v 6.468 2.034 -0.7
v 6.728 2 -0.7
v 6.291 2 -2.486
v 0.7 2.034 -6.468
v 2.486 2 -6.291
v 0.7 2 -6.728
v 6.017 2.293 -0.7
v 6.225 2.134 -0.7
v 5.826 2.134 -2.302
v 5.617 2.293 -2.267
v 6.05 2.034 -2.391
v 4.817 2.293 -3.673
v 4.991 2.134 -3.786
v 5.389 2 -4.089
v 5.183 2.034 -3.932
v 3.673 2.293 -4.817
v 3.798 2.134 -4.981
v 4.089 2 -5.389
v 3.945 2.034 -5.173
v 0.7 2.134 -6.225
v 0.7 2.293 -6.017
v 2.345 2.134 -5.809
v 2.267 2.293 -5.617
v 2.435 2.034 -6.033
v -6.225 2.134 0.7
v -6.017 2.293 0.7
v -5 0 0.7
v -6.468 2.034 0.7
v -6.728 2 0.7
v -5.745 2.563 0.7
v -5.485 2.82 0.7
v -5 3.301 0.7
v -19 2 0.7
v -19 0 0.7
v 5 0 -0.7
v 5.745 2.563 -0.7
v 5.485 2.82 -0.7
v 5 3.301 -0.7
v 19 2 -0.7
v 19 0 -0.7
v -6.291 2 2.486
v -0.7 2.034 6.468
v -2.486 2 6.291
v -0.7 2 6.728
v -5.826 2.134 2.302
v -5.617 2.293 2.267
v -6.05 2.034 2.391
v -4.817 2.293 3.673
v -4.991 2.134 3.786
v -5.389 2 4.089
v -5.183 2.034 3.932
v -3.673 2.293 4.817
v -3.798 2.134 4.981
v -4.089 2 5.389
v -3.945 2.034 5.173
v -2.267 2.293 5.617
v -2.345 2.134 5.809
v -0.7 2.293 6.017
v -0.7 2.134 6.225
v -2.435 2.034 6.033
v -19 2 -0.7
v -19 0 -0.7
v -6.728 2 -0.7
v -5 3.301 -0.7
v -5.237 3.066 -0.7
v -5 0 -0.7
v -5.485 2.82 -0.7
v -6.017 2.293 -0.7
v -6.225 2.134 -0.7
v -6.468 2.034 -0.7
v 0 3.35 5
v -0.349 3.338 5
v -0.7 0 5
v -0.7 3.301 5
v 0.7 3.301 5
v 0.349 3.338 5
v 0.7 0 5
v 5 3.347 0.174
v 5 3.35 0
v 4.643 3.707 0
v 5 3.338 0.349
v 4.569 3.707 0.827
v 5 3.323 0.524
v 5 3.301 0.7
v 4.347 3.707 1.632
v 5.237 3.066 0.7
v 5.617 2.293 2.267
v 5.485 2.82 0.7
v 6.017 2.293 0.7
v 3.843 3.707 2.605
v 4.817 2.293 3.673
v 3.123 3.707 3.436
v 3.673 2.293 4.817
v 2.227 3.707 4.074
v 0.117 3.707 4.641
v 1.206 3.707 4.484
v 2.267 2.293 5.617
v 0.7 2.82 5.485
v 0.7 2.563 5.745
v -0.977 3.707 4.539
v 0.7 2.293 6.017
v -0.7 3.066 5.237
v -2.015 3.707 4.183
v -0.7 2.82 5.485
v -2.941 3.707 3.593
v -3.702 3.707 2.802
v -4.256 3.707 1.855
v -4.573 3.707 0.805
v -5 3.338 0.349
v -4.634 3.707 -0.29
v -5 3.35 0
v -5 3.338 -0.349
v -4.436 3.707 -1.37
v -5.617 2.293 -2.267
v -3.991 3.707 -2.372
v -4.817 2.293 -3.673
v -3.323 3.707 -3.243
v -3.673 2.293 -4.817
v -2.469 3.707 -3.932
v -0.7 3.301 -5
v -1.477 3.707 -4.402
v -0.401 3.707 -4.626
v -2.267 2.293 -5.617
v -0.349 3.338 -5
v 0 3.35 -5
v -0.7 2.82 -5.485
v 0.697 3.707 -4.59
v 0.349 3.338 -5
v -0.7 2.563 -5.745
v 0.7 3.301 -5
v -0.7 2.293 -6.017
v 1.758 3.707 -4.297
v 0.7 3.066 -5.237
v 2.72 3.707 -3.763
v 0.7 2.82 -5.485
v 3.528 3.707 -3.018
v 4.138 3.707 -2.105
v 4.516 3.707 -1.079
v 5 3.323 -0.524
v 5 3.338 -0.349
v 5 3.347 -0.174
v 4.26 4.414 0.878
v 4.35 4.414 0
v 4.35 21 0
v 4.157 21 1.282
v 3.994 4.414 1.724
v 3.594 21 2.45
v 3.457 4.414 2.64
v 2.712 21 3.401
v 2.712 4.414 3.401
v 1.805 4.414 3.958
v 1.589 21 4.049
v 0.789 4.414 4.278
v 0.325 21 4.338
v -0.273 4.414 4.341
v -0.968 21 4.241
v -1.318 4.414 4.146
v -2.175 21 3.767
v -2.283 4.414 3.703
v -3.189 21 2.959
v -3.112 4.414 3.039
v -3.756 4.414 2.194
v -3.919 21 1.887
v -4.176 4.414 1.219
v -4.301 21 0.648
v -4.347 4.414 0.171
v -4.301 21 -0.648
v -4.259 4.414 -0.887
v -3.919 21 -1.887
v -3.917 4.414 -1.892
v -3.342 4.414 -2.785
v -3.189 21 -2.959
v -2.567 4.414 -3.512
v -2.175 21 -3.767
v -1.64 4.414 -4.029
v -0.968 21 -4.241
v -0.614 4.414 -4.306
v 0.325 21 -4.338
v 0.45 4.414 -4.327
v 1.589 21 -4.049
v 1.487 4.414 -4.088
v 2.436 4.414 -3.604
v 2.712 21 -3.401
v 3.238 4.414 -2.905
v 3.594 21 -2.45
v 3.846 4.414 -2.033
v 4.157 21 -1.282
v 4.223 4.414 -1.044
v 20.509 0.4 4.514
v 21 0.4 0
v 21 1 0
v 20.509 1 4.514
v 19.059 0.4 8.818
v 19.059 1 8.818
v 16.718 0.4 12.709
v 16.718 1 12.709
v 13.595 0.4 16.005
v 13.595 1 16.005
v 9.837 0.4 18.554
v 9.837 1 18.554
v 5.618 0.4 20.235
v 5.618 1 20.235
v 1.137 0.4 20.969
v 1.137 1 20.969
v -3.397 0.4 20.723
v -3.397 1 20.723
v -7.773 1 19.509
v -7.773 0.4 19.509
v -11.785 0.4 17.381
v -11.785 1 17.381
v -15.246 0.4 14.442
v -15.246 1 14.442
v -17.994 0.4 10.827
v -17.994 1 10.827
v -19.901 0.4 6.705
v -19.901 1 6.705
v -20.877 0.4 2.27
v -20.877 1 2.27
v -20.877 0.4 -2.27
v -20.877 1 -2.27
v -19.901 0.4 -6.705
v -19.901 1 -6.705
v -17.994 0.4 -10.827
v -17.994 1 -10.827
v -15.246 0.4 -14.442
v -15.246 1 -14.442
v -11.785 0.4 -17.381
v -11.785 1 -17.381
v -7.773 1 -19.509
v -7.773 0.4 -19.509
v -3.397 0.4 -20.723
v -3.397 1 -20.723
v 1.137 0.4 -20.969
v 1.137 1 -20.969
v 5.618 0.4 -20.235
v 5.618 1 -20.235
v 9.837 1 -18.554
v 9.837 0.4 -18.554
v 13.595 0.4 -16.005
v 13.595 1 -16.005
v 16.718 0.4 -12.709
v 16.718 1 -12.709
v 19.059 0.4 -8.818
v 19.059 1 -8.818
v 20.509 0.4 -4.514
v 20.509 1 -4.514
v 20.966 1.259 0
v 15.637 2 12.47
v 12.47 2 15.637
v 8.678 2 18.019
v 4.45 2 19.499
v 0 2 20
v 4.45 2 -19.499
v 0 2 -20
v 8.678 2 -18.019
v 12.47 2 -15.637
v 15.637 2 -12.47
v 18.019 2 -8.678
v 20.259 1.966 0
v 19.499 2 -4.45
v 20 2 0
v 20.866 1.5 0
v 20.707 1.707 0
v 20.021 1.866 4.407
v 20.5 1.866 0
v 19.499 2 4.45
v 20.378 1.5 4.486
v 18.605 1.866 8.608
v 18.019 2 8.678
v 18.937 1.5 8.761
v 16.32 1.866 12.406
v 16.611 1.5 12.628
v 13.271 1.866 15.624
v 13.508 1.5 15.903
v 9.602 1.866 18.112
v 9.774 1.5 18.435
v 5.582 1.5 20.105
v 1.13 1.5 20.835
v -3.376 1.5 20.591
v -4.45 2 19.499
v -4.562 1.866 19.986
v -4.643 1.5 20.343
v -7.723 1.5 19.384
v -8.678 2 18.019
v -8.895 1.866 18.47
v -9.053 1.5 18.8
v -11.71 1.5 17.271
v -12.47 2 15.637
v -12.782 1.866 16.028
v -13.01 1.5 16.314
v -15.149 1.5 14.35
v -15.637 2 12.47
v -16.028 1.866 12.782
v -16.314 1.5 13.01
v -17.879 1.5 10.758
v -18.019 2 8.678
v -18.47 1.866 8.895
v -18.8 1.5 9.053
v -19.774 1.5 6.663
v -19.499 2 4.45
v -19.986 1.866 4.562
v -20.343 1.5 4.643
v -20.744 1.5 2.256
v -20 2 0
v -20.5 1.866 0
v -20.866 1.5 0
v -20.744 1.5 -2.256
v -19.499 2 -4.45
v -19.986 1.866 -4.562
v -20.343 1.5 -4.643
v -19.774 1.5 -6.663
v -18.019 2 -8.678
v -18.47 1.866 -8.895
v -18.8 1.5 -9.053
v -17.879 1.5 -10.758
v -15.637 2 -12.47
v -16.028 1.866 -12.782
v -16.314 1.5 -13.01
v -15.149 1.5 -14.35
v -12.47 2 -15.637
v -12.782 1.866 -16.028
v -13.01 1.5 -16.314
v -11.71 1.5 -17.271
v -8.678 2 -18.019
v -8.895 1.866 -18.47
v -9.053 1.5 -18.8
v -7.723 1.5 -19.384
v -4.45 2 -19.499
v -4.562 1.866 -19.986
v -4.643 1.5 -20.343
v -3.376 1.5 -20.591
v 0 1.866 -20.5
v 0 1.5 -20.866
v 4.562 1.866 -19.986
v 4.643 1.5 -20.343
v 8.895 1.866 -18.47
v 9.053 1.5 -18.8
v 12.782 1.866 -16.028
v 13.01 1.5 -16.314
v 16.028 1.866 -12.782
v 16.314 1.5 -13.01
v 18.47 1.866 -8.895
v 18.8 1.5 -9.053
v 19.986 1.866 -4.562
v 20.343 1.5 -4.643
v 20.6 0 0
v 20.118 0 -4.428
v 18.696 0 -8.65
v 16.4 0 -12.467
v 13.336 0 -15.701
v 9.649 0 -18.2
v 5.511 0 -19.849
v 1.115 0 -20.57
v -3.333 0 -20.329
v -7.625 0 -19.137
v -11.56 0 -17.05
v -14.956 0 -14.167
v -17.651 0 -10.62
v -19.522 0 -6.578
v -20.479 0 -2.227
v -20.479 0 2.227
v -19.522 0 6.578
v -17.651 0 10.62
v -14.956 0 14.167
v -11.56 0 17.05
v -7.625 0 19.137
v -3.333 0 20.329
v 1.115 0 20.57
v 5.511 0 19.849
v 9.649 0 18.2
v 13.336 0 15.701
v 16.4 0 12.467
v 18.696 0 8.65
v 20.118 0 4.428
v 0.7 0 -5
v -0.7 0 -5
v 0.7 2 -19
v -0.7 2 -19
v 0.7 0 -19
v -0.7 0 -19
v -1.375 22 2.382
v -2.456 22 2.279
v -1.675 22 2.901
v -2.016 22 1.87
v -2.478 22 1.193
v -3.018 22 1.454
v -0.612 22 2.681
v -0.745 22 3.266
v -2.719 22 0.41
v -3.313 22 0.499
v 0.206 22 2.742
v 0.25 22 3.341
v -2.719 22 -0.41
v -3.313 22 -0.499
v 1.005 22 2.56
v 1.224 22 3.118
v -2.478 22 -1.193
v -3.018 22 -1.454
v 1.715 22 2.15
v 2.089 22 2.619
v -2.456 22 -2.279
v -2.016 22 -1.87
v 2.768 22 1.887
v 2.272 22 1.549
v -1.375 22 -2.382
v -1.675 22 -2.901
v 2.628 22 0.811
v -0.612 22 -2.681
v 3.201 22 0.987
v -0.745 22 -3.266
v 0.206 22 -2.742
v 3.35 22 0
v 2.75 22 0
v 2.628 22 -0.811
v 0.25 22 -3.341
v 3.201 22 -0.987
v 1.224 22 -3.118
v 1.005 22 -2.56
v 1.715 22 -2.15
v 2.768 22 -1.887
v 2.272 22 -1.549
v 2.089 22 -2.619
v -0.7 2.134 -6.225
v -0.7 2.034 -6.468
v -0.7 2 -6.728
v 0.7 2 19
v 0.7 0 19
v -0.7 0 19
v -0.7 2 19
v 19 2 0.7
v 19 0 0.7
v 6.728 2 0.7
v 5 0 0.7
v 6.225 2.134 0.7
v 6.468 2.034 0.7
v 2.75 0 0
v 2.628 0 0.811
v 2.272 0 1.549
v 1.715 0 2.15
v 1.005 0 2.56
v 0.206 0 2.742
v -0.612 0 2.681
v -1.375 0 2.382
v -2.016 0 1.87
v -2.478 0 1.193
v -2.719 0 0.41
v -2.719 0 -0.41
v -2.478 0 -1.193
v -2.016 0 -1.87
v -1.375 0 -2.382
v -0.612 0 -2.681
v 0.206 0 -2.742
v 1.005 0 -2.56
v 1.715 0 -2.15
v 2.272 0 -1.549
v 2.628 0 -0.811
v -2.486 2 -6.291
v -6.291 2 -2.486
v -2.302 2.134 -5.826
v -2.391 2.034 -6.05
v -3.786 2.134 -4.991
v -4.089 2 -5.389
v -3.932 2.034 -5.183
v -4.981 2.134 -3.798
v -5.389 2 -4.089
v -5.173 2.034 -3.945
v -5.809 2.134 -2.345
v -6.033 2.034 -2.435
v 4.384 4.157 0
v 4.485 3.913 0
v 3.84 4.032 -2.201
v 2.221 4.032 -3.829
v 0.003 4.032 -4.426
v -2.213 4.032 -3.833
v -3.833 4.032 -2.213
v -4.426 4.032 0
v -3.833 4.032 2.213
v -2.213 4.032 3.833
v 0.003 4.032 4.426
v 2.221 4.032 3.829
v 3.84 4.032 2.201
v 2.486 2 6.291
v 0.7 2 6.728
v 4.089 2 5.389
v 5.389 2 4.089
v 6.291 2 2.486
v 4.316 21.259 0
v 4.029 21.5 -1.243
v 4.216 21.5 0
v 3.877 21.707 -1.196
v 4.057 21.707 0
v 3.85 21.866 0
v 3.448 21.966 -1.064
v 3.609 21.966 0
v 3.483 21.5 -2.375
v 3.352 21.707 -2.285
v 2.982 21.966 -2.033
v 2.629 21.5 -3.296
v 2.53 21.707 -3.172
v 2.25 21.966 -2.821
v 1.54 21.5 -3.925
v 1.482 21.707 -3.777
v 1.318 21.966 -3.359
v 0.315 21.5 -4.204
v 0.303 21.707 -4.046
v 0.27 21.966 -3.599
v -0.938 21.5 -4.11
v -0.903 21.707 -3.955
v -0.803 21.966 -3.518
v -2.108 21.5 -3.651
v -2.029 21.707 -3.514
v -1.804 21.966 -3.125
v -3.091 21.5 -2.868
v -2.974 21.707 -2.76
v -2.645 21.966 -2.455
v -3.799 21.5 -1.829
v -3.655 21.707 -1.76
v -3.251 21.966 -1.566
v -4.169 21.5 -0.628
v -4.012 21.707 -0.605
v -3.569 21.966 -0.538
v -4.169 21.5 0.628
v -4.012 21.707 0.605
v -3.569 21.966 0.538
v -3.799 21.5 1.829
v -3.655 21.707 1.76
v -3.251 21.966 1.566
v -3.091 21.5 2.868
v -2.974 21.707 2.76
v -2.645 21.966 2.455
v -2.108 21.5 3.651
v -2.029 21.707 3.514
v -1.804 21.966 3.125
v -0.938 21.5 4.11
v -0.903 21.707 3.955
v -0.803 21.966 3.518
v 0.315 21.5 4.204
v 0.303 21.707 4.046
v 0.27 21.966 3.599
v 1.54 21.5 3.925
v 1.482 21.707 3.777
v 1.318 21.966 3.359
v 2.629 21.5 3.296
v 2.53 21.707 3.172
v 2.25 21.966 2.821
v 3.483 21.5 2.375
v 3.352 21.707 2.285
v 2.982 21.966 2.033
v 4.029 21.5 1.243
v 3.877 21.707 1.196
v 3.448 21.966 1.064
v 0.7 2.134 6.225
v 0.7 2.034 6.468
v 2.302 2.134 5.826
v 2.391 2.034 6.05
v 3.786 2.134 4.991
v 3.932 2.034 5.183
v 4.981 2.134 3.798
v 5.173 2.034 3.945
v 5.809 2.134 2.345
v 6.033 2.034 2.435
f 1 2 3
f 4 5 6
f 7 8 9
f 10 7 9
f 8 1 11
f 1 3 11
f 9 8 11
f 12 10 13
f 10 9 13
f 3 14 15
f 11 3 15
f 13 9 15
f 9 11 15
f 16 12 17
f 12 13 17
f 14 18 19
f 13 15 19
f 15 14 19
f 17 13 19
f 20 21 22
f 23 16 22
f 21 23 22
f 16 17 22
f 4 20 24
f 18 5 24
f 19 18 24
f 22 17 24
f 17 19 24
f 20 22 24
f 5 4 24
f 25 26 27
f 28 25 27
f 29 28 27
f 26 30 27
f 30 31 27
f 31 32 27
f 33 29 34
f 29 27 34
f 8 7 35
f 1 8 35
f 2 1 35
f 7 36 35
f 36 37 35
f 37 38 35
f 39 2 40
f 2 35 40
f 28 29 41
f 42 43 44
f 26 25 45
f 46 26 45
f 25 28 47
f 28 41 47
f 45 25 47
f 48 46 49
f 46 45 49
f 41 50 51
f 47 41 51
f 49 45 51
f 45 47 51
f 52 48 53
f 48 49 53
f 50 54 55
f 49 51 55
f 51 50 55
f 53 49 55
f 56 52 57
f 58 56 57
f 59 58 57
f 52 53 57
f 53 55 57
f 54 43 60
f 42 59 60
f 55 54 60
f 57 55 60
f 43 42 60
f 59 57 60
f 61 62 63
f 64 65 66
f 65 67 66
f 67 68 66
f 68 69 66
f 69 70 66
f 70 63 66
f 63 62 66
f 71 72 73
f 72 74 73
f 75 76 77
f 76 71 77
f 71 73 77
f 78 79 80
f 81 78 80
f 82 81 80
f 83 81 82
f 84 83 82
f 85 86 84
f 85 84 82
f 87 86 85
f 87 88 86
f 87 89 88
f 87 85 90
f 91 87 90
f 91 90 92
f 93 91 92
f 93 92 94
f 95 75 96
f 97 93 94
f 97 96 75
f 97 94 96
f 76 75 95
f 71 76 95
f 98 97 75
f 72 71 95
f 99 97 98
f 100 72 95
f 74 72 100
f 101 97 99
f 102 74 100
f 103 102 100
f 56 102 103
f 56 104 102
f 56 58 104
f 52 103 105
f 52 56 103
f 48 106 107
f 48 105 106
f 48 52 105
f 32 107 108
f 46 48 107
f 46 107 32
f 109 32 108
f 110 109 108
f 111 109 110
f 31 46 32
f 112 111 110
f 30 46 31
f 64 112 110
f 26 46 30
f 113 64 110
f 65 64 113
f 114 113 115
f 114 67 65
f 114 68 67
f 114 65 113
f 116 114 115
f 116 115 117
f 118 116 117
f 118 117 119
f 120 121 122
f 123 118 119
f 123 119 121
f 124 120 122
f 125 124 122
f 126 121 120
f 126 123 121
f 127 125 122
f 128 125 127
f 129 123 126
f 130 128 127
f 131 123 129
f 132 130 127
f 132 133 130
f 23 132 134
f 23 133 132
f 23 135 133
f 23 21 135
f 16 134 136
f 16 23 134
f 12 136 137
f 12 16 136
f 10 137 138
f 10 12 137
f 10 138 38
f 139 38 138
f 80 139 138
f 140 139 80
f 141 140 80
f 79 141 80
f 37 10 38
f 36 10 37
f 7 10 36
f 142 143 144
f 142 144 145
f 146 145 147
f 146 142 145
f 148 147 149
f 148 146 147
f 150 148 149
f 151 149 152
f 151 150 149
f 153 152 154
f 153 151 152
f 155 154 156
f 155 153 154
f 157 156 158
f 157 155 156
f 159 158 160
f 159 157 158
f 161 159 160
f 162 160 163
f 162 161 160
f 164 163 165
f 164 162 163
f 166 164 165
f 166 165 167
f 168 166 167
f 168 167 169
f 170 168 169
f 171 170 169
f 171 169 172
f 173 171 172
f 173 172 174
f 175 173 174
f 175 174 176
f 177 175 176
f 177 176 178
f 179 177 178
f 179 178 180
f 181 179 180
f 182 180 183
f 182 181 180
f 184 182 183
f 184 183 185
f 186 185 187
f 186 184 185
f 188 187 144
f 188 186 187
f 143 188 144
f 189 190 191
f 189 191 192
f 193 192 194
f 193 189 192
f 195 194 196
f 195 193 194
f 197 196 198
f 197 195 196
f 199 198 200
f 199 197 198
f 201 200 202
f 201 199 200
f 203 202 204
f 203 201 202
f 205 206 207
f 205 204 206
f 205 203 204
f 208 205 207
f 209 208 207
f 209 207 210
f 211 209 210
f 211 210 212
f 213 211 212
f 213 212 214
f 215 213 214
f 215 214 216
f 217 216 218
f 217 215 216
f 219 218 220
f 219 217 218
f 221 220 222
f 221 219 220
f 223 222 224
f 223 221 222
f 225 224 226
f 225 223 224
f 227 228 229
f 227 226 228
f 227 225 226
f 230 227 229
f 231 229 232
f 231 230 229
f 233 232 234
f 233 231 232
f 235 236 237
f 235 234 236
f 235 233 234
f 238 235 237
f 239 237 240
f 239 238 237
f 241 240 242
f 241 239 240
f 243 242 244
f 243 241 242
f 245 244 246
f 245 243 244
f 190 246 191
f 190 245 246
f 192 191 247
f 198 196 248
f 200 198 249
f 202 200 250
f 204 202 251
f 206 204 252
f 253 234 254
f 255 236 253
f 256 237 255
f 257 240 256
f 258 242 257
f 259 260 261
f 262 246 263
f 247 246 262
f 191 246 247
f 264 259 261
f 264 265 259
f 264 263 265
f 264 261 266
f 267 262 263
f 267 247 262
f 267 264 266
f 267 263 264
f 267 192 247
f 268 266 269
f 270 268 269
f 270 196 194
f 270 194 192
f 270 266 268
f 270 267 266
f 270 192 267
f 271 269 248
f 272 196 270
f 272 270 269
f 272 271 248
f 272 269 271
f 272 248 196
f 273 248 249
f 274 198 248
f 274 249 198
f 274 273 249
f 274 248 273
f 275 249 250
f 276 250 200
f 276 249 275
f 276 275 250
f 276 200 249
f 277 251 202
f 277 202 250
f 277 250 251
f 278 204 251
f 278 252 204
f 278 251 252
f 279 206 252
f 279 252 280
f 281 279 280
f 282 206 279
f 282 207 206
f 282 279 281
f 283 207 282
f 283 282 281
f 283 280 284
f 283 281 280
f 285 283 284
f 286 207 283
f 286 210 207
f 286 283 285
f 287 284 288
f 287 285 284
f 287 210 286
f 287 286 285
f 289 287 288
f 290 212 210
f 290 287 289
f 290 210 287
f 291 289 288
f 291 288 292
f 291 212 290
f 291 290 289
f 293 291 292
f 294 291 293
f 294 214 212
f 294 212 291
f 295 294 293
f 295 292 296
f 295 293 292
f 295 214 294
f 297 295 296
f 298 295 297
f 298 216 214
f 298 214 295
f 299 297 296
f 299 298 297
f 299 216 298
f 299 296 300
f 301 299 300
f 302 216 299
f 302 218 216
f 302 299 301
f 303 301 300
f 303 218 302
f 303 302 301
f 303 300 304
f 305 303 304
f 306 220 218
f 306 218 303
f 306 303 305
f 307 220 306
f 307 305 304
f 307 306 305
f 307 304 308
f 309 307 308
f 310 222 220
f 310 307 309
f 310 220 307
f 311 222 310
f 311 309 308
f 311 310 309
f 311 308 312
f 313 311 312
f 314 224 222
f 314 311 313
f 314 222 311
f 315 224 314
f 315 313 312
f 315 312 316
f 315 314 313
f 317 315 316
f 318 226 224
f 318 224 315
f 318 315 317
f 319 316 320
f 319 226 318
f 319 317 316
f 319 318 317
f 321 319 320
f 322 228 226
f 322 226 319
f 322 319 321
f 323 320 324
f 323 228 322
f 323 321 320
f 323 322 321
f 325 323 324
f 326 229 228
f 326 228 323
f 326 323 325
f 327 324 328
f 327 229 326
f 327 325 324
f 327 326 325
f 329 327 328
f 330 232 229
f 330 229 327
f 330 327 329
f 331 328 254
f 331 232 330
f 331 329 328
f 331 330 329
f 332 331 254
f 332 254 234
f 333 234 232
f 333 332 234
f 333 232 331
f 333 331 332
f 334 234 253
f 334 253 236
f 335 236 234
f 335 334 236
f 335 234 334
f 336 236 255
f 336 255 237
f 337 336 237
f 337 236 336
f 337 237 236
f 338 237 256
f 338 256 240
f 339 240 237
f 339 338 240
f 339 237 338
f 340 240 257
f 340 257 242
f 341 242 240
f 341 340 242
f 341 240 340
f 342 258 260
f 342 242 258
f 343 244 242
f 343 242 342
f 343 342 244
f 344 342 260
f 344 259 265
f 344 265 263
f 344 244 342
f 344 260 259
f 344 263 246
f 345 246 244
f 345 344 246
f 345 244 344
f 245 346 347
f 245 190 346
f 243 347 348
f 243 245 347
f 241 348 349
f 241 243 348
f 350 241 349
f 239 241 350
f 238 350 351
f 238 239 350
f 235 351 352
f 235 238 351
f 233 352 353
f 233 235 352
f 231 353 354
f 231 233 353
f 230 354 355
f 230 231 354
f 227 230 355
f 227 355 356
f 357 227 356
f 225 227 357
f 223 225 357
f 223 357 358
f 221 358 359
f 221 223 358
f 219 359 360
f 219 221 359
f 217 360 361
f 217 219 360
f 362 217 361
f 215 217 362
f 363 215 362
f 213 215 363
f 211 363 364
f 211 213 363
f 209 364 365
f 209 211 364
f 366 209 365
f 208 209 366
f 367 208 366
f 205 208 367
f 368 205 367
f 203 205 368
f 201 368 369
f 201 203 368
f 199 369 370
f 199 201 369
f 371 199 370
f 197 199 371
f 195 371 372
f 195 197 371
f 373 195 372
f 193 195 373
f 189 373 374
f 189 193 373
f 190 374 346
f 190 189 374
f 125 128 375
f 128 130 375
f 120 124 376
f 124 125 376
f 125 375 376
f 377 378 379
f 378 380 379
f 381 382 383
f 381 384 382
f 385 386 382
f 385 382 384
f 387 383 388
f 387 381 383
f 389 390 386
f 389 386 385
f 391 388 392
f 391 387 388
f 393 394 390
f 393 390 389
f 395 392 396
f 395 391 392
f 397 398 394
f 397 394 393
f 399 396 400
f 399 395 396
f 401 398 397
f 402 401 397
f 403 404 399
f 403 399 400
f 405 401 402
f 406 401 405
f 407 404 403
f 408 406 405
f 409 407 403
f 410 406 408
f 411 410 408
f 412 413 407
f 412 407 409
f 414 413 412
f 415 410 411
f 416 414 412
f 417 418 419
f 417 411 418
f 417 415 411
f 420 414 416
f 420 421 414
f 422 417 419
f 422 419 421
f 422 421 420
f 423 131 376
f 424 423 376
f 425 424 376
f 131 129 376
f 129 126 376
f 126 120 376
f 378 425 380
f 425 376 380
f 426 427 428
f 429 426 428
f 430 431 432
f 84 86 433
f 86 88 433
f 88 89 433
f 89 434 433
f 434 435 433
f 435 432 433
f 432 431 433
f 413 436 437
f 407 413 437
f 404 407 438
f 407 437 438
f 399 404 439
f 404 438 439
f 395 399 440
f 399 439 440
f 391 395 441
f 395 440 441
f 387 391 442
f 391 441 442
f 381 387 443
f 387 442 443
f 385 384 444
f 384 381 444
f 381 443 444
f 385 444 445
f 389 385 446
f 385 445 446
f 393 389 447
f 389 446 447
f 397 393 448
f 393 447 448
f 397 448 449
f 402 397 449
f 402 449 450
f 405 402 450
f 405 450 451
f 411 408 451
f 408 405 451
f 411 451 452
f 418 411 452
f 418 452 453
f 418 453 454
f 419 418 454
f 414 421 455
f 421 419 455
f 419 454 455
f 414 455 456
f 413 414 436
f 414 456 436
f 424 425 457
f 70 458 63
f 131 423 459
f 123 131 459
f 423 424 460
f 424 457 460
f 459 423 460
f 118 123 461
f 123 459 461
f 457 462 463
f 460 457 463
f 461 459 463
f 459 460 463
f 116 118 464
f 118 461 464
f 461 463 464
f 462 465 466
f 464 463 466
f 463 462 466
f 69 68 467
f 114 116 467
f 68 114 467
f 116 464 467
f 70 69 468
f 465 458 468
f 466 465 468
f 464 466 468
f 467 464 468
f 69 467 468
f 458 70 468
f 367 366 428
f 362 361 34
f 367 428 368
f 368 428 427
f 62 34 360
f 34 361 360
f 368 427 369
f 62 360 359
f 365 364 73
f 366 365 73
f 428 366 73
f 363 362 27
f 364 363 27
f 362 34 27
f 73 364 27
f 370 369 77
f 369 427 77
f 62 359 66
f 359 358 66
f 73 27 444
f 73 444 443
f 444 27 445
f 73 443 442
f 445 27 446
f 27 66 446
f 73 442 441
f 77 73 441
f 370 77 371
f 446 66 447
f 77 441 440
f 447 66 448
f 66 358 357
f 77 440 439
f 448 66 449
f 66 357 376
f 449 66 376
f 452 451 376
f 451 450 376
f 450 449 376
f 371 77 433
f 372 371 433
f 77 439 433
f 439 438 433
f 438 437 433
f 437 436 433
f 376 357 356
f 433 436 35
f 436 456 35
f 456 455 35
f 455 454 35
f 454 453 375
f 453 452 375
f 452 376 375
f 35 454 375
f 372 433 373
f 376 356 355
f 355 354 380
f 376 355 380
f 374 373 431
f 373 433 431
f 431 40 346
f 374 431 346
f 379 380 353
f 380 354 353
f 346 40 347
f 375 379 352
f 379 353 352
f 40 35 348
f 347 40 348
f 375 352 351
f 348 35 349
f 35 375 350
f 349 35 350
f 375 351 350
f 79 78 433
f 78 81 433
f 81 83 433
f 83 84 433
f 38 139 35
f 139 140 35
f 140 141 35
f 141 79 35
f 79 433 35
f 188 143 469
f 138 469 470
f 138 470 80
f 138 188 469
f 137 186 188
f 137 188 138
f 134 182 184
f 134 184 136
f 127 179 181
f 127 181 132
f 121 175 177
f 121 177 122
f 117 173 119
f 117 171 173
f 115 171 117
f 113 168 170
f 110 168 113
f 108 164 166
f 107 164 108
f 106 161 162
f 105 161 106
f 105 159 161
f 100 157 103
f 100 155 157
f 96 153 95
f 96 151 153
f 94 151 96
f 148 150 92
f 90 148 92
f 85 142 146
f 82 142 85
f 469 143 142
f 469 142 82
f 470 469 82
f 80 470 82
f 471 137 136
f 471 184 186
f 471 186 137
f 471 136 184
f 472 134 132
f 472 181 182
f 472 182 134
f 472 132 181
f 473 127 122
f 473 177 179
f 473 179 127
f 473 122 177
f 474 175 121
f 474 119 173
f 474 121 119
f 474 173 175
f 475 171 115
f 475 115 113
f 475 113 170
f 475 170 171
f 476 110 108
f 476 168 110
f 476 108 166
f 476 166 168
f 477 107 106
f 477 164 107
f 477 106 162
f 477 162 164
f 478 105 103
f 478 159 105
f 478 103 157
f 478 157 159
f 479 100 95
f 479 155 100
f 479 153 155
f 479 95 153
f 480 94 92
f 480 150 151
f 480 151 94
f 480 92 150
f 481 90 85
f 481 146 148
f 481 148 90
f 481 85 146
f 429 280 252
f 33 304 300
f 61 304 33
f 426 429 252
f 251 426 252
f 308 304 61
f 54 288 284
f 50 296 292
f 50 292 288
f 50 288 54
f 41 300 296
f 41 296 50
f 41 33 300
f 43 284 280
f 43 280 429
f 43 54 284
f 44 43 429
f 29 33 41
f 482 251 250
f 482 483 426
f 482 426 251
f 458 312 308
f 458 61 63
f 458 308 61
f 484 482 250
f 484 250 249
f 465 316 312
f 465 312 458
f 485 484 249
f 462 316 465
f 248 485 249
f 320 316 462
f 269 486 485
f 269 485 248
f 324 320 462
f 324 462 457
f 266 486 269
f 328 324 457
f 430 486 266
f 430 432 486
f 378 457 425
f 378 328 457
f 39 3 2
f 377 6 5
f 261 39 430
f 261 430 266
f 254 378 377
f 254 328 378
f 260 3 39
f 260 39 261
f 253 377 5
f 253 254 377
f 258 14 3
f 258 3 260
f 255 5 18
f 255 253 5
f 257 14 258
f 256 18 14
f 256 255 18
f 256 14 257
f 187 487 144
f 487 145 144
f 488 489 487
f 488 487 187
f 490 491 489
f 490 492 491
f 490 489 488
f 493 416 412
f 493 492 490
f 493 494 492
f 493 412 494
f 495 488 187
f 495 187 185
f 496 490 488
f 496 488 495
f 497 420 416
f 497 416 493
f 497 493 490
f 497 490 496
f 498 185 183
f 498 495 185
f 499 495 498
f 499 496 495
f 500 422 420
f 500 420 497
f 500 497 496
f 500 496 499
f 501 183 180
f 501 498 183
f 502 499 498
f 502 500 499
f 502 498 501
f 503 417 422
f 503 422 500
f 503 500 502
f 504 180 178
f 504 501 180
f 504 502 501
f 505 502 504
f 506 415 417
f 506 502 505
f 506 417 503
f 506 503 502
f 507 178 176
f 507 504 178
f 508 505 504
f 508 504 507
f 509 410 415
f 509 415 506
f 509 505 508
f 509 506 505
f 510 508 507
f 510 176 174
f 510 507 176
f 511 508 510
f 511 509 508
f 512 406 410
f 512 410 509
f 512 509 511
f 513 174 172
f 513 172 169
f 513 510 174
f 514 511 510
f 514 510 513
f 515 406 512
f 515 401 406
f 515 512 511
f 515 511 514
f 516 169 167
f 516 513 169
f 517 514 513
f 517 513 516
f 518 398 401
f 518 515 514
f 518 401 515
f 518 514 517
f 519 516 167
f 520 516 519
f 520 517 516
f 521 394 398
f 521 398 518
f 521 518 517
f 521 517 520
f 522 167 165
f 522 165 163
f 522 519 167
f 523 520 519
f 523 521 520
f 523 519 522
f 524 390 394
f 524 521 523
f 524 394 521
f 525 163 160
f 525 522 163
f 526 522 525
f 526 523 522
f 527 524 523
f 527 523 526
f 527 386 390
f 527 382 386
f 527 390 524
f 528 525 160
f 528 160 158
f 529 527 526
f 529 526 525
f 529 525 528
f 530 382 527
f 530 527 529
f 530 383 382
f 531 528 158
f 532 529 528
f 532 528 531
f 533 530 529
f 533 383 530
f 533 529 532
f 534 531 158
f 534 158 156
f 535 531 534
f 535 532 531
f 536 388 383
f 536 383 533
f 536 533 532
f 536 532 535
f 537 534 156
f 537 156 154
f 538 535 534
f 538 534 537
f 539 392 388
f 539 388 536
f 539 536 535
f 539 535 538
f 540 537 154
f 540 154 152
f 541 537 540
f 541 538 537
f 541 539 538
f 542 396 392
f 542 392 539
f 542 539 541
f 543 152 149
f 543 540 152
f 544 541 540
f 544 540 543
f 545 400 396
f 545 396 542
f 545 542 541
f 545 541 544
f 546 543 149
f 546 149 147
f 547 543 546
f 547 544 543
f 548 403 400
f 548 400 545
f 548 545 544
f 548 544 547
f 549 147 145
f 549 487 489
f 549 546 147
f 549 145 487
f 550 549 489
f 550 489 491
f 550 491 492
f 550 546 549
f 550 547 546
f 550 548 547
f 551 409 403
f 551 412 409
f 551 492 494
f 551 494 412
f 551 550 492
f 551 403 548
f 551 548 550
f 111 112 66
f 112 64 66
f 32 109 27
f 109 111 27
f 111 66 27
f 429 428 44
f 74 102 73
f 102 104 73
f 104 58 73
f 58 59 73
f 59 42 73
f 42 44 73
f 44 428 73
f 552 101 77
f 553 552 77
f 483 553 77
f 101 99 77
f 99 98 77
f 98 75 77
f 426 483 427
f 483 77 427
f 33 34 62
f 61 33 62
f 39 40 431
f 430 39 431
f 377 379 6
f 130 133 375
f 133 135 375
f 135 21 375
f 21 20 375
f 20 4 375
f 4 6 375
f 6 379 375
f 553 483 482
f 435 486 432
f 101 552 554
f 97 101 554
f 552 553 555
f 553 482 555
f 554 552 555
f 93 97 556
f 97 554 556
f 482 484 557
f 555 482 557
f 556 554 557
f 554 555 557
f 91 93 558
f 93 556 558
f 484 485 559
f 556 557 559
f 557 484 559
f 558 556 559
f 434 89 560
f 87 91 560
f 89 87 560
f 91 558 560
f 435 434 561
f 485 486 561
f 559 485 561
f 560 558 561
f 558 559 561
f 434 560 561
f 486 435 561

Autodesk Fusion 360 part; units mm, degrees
sketch "5.5 drilling alignment tool" plane through (0, 0, 0) normal (0, 1, 0) x (1, 0, 0)
  circle A0 centre (0, 0) radius 2.75
  circle A1 centre (0, 0) radius 4.35
  circle A2 centre (0, 0) radius 21
  line L0 (0, 0) -> (0, 30.5486) construction
  line L1 (0, 0) -> (37.4223, 0) construction
  line L2 (5, 0.7) -> (19, 0.7)
  line L3 (19, 0.7) -> (19, -0.7)
  line L4 (19, -0.7) -> (5, -0.7)
  line L5 (5, -0.7) -> (5, 0.7)
  dimension "d1" = 5.5
  dimension "d2" = 1.6
  dimension "d3" = 42
  dimension "d12" = 5
  dimension "d13" = 14
  dimension "d14" = 1.4
extrude "Extrude1" add sketch "5.5 drilling alignment tool" along normal blind 22 contours A1
extrude "Extrude2" add sketch "5.5 drilling alignment tool" along normal blind 2 contours A2 | L2 L3 L4 L5
chamfer "Chamfer1" distance 2 angle 45 1 edges at (-4.0556, 2, 1.573)
fillet "Fillet1" radius 1 3 faces at (4.3284, 10, 0.4331) (-3.5435, 2.6667, 4.4434) (16.0385, 2, 1.0433)
chamfer "Chamfer2" distance 0.4 angle 45 1 edges at (-19.5789, 0, 7.5939)
extrude "Extrude3" cut sketch "5.5 drilling alignment tool" along normal blind 4 contours L2 L3 L4 L5
pattern_circular "C-Pattern1" count 4 over 360 about axis through (0, 1.75, 0) along (0, 1, 0) of "Extrude3"
